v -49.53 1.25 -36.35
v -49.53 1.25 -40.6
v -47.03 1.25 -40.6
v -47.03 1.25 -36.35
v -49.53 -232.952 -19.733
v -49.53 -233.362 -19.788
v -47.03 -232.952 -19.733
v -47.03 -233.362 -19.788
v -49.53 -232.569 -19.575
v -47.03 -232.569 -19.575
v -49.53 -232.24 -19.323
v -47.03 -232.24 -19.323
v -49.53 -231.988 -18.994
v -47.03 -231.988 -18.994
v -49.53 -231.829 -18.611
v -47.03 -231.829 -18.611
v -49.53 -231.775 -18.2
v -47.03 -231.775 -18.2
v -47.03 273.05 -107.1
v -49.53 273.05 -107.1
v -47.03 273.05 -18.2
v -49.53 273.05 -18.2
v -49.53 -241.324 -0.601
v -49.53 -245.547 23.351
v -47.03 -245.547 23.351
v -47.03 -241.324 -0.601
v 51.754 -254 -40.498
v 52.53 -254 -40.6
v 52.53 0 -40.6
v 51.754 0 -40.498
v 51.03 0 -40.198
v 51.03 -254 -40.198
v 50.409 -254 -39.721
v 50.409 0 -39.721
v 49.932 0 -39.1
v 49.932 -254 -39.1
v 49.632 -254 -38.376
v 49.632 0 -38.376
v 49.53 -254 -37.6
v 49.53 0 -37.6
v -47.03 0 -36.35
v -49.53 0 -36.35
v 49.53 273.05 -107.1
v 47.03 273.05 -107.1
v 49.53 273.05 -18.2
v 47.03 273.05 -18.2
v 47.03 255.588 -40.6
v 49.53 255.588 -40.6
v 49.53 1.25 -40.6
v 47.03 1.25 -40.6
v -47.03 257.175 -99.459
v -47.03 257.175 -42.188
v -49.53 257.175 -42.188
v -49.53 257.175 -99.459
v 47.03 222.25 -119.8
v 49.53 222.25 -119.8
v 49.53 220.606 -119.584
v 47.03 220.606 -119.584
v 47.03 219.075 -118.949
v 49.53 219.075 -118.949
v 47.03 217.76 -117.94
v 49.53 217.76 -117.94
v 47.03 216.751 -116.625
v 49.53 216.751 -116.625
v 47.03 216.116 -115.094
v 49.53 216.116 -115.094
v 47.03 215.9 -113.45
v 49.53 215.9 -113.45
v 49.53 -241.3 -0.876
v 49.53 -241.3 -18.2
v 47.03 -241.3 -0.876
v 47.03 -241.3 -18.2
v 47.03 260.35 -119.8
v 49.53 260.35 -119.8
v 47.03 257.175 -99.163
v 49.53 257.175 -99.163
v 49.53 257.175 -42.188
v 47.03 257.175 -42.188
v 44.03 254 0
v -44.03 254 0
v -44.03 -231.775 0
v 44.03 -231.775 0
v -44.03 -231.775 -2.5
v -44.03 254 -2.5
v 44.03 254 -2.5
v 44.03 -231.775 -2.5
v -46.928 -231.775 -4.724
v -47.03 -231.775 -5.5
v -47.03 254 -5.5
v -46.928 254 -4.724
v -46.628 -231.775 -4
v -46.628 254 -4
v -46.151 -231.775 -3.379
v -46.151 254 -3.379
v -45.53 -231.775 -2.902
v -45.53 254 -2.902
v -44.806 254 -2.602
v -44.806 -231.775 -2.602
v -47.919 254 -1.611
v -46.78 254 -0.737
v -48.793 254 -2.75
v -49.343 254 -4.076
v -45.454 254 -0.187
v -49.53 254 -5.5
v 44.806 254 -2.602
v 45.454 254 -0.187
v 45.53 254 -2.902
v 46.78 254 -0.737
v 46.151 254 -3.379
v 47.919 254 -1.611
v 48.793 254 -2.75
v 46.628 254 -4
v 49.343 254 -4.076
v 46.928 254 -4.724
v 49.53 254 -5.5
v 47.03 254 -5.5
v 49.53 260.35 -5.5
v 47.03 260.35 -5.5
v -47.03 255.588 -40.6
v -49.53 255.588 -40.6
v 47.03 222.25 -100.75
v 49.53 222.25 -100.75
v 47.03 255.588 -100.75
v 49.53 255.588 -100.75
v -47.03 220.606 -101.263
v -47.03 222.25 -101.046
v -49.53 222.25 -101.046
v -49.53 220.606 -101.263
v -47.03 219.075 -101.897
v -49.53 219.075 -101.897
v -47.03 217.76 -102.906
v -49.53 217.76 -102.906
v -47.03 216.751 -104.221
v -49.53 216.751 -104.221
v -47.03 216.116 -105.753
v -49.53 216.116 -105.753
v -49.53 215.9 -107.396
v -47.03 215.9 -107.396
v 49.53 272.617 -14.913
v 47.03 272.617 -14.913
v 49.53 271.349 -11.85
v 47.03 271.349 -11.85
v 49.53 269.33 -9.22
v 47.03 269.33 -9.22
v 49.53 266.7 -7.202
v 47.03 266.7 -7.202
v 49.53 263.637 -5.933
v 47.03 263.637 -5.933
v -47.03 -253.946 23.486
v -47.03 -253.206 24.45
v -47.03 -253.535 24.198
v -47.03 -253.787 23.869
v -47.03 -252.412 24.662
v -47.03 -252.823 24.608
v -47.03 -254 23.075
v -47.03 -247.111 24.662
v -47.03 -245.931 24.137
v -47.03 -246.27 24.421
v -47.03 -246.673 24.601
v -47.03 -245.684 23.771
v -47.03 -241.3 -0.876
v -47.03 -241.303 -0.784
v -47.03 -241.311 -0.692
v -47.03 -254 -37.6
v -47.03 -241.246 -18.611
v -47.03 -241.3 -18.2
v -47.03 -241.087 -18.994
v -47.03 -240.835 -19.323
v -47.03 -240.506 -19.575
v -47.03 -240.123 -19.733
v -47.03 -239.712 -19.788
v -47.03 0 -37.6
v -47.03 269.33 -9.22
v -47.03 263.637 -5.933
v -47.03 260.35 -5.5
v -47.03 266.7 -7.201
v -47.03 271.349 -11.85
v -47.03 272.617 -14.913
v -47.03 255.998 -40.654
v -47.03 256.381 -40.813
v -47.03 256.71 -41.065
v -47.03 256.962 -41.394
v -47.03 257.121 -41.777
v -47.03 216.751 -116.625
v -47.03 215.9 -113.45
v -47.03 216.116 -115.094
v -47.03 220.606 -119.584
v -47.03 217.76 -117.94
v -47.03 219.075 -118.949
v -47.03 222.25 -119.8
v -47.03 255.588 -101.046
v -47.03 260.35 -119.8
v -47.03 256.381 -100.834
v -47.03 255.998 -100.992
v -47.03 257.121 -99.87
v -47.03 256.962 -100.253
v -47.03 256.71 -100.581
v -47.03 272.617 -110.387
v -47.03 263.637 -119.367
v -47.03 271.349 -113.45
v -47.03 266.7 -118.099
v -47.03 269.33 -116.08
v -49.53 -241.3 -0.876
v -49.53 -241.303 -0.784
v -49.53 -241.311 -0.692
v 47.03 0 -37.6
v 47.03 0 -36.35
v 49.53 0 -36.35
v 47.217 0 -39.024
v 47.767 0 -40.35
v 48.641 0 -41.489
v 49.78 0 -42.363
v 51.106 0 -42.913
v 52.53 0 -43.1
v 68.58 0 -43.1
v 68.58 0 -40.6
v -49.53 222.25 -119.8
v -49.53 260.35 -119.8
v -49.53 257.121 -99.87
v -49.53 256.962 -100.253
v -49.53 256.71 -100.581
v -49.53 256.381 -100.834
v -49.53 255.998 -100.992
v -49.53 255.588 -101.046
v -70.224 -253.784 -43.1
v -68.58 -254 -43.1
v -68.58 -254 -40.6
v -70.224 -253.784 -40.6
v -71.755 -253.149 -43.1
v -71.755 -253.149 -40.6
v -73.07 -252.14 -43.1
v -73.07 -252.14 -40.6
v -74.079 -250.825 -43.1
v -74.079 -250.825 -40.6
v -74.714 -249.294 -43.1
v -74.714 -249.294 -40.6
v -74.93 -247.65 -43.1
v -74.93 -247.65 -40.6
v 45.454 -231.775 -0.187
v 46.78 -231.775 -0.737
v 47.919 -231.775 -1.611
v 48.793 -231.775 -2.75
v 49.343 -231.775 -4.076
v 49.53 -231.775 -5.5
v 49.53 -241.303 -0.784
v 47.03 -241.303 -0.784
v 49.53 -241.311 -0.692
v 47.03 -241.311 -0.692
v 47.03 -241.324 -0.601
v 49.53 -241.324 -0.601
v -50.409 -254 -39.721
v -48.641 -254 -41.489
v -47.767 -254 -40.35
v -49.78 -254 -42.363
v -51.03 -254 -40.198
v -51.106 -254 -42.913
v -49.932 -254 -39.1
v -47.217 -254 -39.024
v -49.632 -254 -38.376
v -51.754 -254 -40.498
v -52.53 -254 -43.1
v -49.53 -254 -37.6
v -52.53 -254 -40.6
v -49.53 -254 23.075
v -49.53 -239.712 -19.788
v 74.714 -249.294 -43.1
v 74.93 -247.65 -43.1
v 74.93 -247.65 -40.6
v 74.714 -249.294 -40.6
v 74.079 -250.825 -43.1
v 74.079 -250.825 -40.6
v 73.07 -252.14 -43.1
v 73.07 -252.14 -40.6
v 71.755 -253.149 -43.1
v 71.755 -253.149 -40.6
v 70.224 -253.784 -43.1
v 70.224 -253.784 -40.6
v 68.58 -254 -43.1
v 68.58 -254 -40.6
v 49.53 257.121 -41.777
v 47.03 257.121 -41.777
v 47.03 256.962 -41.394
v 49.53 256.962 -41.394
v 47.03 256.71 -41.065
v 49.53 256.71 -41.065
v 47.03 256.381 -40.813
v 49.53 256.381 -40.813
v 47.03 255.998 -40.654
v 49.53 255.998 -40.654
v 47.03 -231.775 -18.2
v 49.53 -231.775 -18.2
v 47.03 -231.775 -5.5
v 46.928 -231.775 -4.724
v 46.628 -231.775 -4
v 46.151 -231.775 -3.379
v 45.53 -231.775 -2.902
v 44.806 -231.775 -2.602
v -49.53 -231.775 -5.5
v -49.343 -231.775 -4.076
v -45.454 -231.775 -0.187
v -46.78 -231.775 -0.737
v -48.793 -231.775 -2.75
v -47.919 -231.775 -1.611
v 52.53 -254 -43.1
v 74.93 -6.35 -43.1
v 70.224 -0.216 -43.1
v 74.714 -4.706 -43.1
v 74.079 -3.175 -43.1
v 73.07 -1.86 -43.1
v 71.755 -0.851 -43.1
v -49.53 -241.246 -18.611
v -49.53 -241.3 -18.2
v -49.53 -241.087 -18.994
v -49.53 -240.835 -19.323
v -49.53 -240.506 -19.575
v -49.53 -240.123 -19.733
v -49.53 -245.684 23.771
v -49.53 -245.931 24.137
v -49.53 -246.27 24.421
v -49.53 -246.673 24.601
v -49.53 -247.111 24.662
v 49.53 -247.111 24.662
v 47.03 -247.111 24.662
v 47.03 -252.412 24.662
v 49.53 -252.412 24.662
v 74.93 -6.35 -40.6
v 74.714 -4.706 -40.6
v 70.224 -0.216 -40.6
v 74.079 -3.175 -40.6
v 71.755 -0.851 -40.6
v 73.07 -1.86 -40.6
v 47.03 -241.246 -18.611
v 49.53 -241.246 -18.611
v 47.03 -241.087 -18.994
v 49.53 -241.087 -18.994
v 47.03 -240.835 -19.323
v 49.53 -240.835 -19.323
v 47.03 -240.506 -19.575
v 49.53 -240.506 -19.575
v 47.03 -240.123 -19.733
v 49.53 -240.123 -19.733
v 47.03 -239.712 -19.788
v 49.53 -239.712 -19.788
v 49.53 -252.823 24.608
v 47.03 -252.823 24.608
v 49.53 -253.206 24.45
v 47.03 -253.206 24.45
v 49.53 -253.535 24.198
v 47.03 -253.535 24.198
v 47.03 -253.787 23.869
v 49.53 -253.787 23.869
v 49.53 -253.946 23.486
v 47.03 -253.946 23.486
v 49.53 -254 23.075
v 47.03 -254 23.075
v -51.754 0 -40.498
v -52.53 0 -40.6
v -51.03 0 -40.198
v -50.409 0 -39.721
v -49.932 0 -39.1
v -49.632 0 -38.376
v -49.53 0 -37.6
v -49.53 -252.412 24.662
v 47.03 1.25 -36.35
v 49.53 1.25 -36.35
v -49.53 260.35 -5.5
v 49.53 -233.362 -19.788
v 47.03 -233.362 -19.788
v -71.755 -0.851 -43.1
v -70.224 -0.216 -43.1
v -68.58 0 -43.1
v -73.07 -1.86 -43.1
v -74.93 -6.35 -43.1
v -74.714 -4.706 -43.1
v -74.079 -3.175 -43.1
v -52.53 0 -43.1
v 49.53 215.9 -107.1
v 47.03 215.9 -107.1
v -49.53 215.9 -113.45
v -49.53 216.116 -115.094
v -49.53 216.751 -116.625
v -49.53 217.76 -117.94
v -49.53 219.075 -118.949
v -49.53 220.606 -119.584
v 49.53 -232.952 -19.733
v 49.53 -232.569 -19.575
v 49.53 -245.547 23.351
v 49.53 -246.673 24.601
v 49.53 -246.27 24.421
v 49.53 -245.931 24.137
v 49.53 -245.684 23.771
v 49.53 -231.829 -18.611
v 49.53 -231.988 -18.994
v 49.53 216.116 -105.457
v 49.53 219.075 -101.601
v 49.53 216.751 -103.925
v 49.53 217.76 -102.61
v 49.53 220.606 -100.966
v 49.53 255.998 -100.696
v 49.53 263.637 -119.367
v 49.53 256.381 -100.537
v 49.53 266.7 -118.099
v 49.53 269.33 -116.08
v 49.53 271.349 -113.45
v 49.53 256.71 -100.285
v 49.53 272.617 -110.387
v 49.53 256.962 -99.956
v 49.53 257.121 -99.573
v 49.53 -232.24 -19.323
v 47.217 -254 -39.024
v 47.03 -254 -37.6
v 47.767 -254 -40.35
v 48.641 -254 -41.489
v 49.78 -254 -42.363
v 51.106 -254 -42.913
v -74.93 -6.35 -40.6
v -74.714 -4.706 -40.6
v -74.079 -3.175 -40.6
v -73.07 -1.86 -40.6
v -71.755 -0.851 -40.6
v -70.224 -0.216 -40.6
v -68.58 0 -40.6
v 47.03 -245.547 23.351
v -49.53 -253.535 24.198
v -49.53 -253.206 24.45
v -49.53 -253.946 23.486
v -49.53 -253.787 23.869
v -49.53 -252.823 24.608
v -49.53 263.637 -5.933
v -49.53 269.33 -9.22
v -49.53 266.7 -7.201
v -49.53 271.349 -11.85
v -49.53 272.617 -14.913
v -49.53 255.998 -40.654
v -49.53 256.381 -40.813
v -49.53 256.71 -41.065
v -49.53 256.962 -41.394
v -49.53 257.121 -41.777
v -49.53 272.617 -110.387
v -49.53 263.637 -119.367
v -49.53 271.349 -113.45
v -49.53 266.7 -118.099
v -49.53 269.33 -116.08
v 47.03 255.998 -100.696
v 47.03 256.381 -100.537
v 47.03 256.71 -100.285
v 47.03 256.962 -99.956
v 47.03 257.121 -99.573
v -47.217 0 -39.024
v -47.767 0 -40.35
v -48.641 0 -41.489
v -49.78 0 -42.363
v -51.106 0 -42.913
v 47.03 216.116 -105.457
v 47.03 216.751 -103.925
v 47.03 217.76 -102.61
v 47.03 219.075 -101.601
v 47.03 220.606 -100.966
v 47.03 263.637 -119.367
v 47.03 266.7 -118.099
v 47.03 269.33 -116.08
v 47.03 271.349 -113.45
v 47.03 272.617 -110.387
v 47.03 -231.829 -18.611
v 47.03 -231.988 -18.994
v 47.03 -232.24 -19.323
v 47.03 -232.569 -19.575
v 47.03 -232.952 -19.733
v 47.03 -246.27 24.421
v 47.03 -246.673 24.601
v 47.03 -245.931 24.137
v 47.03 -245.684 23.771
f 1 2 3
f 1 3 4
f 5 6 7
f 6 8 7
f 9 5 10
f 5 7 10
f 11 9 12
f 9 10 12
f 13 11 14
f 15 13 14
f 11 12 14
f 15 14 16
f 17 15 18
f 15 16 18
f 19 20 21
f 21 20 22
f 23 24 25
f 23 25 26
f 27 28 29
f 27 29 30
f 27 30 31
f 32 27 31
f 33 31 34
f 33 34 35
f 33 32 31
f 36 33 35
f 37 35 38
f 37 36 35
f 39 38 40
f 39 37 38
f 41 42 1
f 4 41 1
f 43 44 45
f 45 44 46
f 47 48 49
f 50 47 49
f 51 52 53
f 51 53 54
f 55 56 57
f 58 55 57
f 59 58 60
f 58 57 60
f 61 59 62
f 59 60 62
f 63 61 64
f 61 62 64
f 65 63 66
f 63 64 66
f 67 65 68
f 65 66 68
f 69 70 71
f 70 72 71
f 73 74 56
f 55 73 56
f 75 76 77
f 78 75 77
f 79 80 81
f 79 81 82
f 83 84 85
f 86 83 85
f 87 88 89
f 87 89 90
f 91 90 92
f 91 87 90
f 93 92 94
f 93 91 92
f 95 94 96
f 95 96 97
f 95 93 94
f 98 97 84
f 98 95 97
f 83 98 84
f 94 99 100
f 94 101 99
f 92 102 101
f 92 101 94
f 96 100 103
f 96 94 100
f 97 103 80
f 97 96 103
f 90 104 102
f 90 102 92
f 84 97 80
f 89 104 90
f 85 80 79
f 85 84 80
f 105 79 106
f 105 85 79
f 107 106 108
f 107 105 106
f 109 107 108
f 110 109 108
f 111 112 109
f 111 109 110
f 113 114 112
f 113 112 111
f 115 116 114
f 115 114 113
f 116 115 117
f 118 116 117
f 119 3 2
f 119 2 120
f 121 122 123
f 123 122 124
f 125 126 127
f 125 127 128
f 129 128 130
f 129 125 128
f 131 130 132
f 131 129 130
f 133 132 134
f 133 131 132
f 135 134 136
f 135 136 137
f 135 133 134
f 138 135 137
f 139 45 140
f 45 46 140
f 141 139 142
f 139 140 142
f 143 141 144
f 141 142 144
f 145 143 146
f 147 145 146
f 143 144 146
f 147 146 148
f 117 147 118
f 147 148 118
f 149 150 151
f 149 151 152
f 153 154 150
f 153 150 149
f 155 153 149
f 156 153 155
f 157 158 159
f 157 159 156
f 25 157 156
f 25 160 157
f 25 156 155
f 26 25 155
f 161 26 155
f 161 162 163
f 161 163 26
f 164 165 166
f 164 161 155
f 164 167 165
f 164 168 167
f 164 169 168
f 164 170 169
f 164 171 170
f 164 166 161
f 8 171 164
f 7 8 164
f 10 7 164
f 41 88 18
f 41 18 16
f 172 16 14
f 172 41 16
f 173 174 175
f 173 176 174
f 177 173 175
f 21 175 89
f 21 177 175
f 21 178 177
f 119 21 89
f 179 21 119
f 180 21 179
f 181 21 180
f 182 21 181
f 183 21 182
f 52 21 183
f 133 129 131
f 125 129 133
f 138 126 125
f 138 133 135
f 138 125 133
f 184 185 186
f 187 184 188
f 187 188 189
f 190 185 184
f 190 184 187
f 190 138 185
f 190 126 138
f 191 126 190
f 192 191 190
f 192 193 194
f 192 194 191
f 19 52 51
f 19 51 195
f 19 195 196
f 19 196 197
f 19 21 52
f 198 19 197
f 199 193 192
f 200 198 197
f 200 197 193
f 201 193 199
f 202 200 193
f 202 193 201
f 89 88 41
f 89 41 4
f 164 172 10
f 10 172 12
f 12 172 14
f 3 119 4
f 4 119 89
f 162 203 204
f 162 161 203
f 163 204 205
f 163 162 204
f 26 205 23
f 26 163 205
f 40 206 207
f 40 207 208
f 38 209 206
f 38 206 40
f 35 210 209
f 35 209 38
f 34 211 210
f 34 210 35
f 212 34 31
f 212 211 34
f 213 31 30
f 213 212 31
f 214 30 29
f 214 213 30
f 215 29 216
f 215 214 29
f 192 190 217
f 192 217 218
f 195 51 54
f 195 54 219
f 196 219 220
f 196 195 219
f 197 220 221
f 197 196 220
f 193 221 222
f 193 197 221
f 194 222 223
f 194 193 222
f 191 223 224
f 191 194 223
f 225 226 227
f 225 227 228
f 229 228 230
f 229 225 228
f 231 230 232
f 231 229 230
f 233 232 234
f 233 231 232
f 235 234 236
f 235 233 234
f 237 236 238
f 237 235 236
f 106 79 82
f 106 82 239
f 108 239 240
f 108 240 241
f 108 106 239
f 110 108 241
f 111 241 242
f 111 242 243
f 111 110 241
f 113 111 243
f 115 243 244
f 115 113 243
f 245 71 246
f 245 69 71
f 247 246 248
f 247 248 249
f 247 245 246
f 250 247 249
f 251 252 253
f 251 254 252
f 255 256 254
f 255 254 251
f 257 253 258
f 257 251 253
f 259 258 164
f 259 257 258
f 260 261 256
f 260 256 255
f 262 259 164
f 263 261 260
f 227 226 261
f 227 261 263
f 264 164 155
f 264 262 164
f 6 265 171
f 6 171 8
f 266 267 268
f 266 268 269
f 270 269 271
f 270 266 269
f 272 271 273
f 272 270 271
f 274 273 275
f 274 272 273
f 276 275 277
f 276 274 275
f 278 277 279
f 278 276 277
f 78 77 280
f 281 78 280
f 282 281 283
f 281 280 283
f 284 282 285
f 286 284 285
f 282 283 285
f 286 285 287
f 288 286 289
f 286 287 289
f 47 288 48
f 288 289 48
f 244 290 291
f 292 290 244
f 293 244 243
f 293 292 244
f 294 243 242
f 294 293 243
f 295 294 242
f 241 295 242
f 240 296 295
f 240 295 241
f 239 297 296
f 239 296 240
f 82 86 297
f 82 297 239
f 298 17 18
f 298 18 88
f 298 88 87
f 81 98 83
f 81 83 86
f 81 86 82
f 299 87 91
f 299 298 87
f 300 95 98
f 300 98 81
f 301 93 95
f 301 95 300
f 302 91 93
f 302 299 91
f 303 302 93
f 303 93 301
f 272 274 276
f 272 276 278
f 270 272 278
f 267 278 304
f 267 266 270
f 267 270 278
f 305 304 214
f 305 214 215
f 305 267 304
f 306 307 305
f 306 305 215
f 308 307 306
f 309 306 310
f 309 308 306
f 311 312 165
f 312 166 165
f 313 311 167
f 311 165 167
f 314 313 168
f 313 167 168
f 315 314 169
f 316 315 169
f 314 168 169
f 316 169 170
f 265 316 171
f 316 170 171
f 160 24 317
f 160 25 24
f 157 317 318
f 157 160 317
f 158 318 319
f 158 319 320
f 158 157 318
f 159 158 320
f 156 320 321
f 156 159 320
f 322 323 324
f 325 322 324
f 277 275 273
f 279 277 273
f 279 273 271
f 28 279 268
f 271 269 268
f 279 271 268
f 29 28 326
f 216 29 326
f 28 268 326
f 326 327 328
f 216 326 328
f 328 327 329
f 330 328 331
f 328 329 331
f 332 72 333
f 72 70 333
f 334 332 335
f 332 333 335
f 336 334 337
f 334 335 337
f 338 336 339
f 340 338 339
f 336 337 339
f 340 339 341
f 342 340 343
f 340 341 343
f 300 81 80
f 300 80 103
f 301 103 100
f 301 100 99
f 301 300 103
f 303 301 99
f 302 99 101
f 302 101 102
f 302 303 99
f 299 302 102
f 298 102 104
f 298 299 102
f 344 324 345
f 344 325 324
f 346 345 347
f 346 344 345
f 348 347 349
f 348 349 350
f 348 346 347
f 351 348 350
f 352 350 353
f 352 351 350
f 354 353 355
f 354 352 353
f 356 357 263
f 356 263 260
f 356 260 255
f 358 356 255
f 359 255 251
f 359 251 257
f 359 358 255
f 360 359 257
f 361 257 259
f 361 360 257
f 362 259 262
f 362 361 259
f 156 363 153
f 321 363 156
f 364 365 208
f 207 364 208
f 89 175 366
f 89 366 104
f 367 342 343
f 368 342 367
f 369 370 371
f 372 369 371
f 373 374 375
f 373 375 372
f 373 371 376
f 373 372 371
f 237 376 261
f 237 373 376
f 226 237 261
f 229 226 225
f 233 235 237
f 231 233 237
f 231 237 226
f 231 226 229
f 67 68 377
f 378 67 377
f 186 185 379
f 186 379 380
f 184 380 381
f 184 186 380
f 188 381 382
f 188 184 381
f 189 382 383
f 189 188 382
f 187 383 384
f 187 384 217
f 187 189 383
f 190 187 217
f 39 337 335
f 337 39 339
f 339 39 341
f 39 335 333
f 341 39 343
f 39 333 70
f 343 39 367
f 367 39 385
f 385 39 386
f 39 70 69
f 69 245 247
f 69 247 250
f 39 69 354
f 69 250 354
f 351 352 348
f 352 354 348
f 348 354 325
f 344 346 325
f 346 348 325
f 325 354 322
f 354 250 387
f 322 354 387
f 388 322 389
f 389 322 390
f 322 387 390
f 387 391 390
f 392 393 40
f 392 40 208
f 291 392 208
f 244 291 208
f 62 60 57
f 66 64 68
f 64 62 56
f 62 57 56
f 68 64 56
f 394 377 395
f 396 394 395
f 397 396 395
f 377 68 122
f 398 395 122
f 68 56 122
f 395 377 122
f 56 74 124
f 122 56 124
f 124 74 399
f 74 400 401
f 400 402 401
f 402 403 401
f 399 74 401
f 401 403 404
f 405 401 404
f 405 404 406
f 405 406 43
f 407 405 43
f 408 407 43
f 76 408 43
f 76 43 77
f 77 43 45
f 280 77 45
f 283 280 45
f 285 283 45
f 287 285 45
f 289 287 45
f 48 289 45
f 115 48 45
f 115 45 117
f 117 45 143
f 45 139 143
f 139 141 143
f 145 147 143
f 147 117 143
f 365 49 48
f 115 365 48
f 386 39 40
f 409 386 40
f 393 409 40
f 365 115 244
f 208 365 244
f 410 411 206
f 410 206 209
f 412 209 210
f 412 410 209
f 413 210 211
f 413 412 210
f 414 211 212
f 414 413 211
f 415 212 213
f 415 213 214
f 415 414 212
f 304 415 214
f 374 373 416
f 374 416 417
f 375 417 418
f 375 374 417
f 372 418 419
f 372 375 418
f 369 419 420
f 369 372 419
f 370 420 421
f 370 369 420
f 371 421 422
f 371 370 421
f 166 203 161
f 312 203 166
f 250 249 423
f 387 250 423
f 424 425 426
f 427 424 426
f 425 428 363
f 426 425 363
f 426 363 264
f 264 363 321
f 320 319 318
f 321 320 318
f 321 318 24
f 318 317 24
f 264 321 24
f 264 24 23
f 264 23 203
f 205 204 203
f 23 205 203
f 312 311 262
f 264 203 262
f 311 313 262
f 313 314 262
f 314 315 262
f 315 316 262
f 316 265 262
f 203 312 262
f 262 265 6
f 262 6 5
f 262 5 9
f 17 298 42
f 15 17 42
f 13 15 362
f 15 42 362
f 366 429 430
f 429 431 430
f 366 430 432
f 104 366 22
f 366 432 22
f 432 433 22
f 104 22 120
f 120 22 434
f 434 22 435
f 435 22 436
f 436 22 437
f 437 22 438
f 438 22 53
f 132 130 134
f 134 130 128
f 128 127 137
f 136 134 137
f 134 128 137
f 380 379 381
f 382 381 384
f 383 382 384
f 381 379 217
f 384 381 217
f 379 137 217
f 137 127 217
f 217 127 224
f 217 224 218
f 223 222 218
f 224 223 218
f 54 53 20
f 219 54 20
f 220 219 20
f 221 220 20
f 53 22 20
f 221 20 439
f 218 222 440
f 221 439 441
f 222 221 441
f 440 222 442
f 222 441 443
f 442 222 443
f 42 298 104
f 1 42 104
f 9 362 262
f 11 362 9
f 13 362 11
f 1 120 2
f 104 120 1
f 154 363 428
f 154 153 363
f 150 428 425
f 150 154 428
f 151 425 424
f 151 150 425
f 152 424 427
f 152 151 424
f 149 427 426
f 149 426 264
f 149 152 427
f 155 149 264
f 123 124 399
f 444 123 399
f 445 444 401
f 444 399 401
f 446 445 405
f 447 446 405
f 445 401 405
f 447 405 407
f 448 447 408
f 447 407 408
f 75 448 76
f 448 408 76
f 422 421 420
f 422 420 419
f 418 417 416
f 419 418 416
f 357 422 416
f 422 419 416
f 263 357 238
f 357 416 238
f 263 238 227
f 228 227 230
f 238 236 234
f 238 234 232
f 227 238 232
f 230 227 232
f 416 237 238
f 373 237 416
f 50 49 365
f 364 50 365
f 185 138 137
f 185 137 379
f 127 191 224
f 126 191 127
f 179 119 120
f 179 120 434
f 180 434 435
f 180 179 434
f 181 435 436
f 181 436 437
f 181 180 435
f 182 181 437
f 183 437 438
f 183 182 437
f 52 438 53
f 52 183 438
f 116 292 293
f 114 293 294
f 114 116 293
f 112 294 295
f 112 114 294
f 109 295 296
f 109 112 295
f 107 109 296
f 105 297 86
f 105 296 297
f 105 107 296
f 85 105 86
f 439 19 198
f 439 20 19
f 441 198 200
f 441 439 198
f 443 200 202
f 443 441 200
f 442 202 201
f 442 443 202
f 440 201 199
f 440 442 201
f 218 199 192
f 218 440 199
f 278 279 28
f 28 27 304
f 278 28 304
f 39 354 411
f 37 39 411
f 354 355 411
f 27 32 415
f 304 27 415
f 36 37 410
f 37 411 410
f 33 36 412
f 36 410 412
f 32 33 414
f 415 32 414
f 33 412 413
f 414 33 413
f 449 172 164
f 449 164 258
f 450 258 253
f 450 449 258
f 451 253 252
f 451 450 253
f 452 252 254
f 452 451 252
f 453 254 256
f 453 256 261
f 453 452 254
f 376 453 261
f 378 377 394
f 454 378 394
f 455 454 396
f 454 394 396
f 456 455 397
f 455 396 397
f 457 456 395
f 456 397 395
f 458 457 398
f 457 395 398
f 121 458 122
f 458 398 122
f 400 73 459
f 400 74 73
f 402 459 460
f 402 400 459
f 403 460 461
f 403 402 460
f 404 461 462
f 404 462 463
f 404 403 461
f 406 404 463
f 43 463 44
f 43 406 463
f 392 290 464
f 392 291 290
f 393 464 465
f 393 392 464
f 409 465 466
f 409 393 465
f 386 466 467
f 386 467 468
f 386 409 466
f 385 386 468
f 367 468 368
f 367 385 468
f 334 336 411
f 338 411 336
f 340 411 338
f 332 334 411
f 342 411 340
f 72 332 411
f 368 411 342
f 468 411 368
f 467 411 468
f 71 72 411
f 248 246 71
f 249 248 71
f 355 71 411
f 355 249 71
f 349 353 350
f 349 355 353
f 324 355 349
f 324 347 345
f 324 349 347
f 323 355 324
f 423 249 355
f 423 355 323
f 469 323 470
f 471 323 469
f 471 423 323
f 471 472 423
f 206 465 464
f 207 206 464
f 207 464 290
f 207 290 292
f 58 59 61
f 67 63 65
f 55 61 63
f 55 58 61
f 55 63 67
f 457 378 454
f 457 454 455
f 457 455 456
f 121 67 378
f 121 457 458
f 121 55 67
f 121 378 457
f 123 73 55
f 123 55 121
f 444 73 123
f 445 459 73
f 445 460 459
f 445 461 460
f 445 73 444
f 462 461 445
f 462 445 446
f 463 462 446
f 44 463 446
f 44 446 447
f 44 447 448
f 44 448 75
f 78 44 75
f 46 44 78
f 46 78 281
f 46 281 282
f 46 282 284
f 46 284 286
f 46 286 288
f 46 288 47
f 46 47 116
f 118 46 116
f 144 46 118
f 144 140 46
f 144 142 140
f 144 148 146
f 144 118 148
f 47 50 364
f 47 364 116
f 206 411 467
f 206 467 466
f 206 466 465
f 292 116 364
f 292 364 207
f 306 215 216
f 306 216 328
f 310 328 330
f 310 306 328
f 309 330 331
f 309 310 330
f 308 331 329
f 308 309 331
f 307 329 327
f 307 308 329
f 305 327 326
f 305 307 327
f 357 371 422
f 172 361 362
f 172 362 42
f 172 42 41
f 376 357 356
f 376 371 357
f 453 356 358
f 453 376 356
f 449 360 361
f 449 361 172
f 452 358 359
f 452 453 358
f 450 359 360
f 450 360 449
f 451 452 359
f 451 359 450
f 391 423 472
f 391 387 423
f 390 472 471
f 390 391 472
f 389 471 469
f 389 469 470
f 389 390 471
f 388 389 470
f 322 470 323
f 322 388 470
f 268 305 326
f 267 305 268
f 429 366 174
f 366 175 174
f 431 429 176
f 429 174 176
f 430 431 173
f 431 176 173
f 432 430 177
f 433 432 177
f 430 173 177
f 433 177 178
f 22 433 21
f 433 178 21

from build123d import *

# Parameters (mm, degrees)
SKETCH1_W                     = 99.06
SKETCH1_H                     = 508
BASE_FLANGE1_DEPTH            = 2.5
EDGE_FLANGE1_STRIP_W          = 16
EDGE_FLANGE1_STRIP_H          = 2.5
EDGE_FLANGE1_STRIP_CUT_DEPTH  = 508
EDGE_FLANGE1_DEPTH            = 508
EDGE_FLANGE2_STRIP_W          = 16
EDGE_FLANGE2_STRIP_H          = 2.5
EDGE_FLANGE2_STRIP_CUT_DEPTH  = 254
EDGE_FLANGE2_RELIEF_W         = 17.25
EDGE_FLANGE2_RELIEF_H         = 1.25
EDGE_FLANGE2_RELIEF_CUT_DEPTH = 2.5
EDGE_FLANGE2_DEPTH            = 254
EDGE_FLANGE2_START            = 2.5
EDGE_FLANGE2_FLAT_DEPTH       = 2.5
EDGE_FLANGE3_STRIP_W          = 16
EDGE_FLANGE3_STRIP_H          = 2.5
EDGE_FLANGE3_STRIP_CUT_DEPTH  = 508
EDGE_FLANGE3_DEPTH            = 508
EDGE_FLANGE4_STRIP_W          = 16
EDGE_FLANGE4_STRIP_H          = 2.5
EDGE_FLANGE4_STRIP_CUT_DEPTH  = 254
EDGE_FLANGE4_RELIEF_W         = 17.25
EDGE_FLANGE4_RELIEF_H         = 1.25
EDGE_FLANGE4_RELIEF_CUT_DEPTH = 2.5
EDGE_FLANGE4_DEPTH            = 254
EDGE_FLANGE4_START            = 2.5
EDGE_FLANGE4_FLAT_DEPTH       = 2.5
SKETCH22_W                    = 5.5
SKETCH22_H                    = 22.225
CUT_EXTRUDE5_DEPTH            = 287.118684465
TAB1_DEPTH                    = 2.5
TAB2_START                    = -2.5
TAB2_DEPTH                    = 2.5
TAB3_DEPTH                    = 2.5
TAB4_START                    = -2.5
TAB4_DEPTH                    = 2.5
SKETCH47_W                    = 14.2875
SKETCH47_H                    = 9.525
CUT_EXTRUDE6_DEPTH            = 337.63035334
FILLET2_R                     = 1.5875
FILLET3_R                     = 1.5875
SKETCH48_W                    = 2.54
SKETCH48_H                    = 15.875
CUT_EXTRUDE9_DEPTH            = 337.63035334
FILLET4_R                     = 12.7


# Read off the part's stored shape, not the designer's step: Tab2
# Sheet-metal steps are written as plain solids
with BuildPart() as part:
    # Sketch1 → Base-Flange1 (new body)
    with BuildSketch(Plane.XY):
        Rectangle(SKETCH1_W, SKETCH1_H)
    extrude(amount=-BASE_FLANGE1_DEPTH)

    # Edge-Flange1 strip (across the edge) → Edge-Flange1 strip cut (cut)
    with BuildSketch(Plane(origin=(-49.53, -254, -2.5), x_dir=(1, 0, 0), z_dir=(0, 1, 0))):
        with Locations((-2.5, -1.25)):
            Rectangle(EDGE_FLANGE1_STRIP_W, EDGE_FLANGE1_STRIP_H)
    extrude(amount=EDGE_FLANGE1_STRIP_CUT_DEPTH, mode=Mode.SUBTRACT)

    # Edge-Flange1 section (across the edge) → Edge-Flange1 (add)
    with BuildSketch(Plane(origin=(-49.53, -254, -2.5), x_dir=(1, 0, 0), z_dir=(0, 1, 0))):
        with BuildLine():
            Line((0, 3), (0, 38.1))
            Line((0, 38.1), (2.5, 38.1))
            Line((2.5, 38.1), (2.5, 3))
            ThreePointArc((2.5, 3), (3.378679656, 0.878679656), (5.5, 0))
            Line((5.5, 0), (5.5, -2.5))
            ThreePointArc((5.5, -2.5), (1.610912703, -0.889087297), (0, 3))
        make_face()
    extrude(amount=EDGE_FLANGE1_DEPTH)

    # Edge-Flange2 strip (across the edge) → Edge-Flange2 strip cut (cut)
    with BuildSketch(Plane(origin=(-49.53, 0, -40.6), x_dir=(0, 0, 1), z_dir=(0, -1, 0))):
        with Locations((-5, -1.25)):
            Rectangle(EDGE_FLANGE2_STRIP_W, EDGE_FLANGE2_STRIP_H)
    extrude(amount=EDGE_FLANGE2_STRIP_CUT_DEPTH, mode=Mode.SUBTRACT)

    # Edge-Flange2 relief (on the sheet) → Edge-Flange2 relief cut (cut)
    with BuildSketch(Plane(origin=(-49.53, 0, -37.6), x_dir=(0, 0, 1), z_dir=(-1, 0, 0))):
        with Locations((-7.375, 0.625)):
            Rectangle(EDGE_FLANGE2_RELIEF_W, EDGE_FLANGE2_RELIEF_H)
    extrude(amount=-EDGE_FLANGE2_RELIEF_CUT_DEPTH, mode=Mode.SUBTRACT)

    # Edge-Flange2 bend section (across the edge) → Edge-Flange2 (add)
    with BuildSketch(Plane(origin=(-49.53, 0, -40.6), x_dir=(0, 0, 1), z_dir=(0, -1, 0))):
        with BuildLine():
            Line((-2.5, 3), (0, 3))
            ThreePointArc((0, 3), (0.878679656, 0.878679656), (3, 0))
            Line((3, 0), (3, -2.5))
            ThreePointArc((3, -2.5), (-0.889087297, -0.889087297), (-2.5, 3))
        make_face()
    extrude(amount=EDGE_FLANGE2_DEPTH)

    # Edge-Flange2 profile (on flange) → Edge-Flange2 flat (add)
    with BuildSketch(Plane(origin=(-49.53, 0, -40.6), x_dir=(0, -1, 0), z_dir=(0, 0, -1)).offset(EDGE_FLANGE2_START)):
        with BuildLine():
            Line((254, 3), (254, 19.05))
            ThreePointArc((254, 19.05), (252.140128061, 23.540128061), (247.65, 25.4))
            Line((247.65, 25.4), (6.35, 25.4))
            ThreePointArc((6.35, 25.4), (1.859871939, 23.540128061), (0, 19.05))
            Line((0, 19.05), (0, 3))
            Line((0, 3), (254, 3))
        make_face()
    extrude(amount=-EDGE_FLANGE2_FLAT_DEPTH)

    # Edge-Flange3 strip (across the edge) → Edge-Flange3 strip cut (cut)
    with BuildSketch(Plane(origin=(49.53, 254, -2.5), x_dir=(-1, 0, 0), z_dir=(0, -1, 0))):
        with Locations((-2.5, -1.25)):
            Rectangle(EDGE_FLANGE3_STRIP_W, EDGE_FLANGE3_STRIP_H)
    extrude(amount=EDGE_FLANGE3_STRIP_CUT_DEPTH, mode=Mode.SUBTRACT)

    # Edge-Flange3 section (across the edge) → Edge-Flange3 (add)
    with BuildSketch(Plane(origin=(49.53, 254, -2.5), x_dir=(-1, 0, 0), z_dir=(0, -1, 0))):
        with BuildLine():
            Line((0, 3), (0, 38.1))
            Line((0, 38.1), (2.5, 38.1))
            Line((2.5, 38.1), (2.5, 3))
            ThreePointArc((2.5, 3), (3.378679656, 0.878679656), (5.5, 0))
            Line((5.5, 0), (5.5, -2.5))
            ThreePointArc((5.5, -2.5), (1.610912703, -0.889087297), (0, 3))
        make_face()
    extrude(amount=EDGE_FLANGE3_DEPTH)

    # Edge-Flange4 strip (across the edge) → Edge-Flange4 strip cut (cut)
    with BuildSketch(Plane(origin=(49.53, -254, -40.6), x_dir=(0, 0, 1), z_dir=(0, 1, 0))):
        with Locations((-5, -1.25)):
            Rectangle(EDGE_FLANGE4_STRIP_W, EDGE_FLANGE4_STRIP_H)
    extrude(amount=EDGE_FLANGE4_STRIP_CUT_DEPTH, mode=Mode.SUBTRACT)

    # Edge-Flange4 relief (on the sheet) → Edge-Flange4 relief cut (cut)
    with BuildSketch(Plane(origin=(49.53, -254, -37.6), x_dir=(0, 0, 1), z_dir=(1, 0, 0))):
        with Locations((-7.375, -254.625)):
            Rectangle(EDGE_FLANGE4_RELIEF_W, EDGE_FLANGE4_RELIEF_H)
    extrude(amount=-EDGE_FLANGE4_RELIEF_CUT_DEPTH, mode=Mode.SUBTRACT)

    # Edge-Flange4 bend section (across the edge) → Edge-Flange4 (add)
    with BuildSketch(Plane(origin=(49.53, -254, -40.6), x_dir=(0, 0, 1), z_dir=(0, 1, 0))):
        with BuildLine():
            Line((-2.5, 3), (0, 3))
            ThreePointArc((0, 3), (0.878679656, 0.878679656), (3, 0))
            Line((3, 0), (3, -2.5))
            ThreePointArc((3, -2.5), (-0.889087297, -0.889087297), (-2.5, 3))
        make_face()
    extrude(amount=EDGE_FLANGE4_DEPTH)

    # Edge-Flange4 profile (on flange) → Edge-Flange4 flat (add)
    with BuildSketch(Plane(origin=(49.53, 0, -40.6), x_dir=(0, 1, 0), z_dir=(0, 0, -1)).offset(EDGE_FLANGE4_START)):
        with BuildLine():
            Line((-254, 19.05), (-254, 3))
            Line((-254, 3), (0, 3))
            Line((0, 3), (0, 19.05))
            ThreePointArc((0, 19.05), (-1.859871939, 23.540128061), (-6.35, 25.4))
            Line((-6.35, 25.4), (-247.65, 25.4))
            ThreePointArc((-247.65, 25.4), (-252.140128061, 23.540128061), (-254, 19.05))
        make_face()
    extrude(amount=-EDGE_FLANGE4_FLAT_DEPTH)

    # Sketch22 → Cut-Extrude5 (cut, through all)
    with BuildSketch(Plane.ZY.offset(49.53)):
        with Locations((-2.75, -242.8875)):
            Rectangle(SKETCH22_W, SKETCH22_H)
    extrude(amount=-CUT_EXTRUDE5_DEPTH, mode=Mode.SUBTRACT)

    # Sketch30 → Tab1 (add)
    with BuildSketch(Plane.ZY.offset(49.53)):
        Polygon((-5.5, -254), (24.6625, -254), (24.6625, -245.77870531), (-0.7375, -241.3), (-5.5, -241.3), align=None)
    extrude(amount=-TAB1_DEPTH)

    # Tab2 outline → Tab2 (add)
    with BuildSketch(Plane(origin=(49.53, 0, 0), x_dir=(0, 0, -1), z_dir=(1, 0, 0)).offset(TAB2_START)):
        Polygon((-24.6625, -254), (5.5, -254), (5.5, -241.3), (0.7375, -241.3), (-24.6625, -245.77870531), align=None)
    extrude(amount=TAB2_DEPTH)

    # Sketch43 → Tab3 (add)
    with BuildSketch(Plane(origin=(49.53, 0, 0), x_dir=(0, 0, -1), z_dir=(1, 0, 0))):
        with BuildLine():
            Line((8.675031572, 288.925), (116.625031572, 288.925))
            ThreePointArc((116.625031572, 288.925), (118.870095602, 287.99506403), (119.800031572, 285.75))
            Line((119.800031572, 285.75), (119.800031572, 254))
            Line((119.800031572, 254), (119.800031572, 222.25))
            ThreePointArc((119.800031572, 222.25), (117.940159632, 217.759871939), (113.450031572, 215.9))
            Line((113.450031572, 215.9), (107.100031572, 215.9))
            ThreePointArc((107.100031572, 215.9), (102.609903511, 217.759871939), (100.750031572, 222.25))
            Line((100.750031572, 222.25), (100.750031572, 250.825))
            Line((100.750031572, 250.825), (100.750031572, 254))
            Line((100.750031572, 254), (100.750031572, 255.5875))
            ThreePointArc((100.750031572, 255.5875), (100.285063587, 256.710032015), (99.162531572, 257.175))
            Line((99.162531572, 257.175), (42.1875, 257.175))
            ThreePointArc((42.1875, 257.175), (41.064967985, 256.710032015), (40.6, 255.5875))
            Line((40.6, 255.5875), (40.6, 254))
            Line((40.6, 254), (5.500031572, 254))
            Line((5.500031572, 254), (5.500031572, 285.75))
            ThreePointArc((5.500031572, 285.75), (6.429967542, 287.99506403), (8.675031572, 288.925))
        make_face()
    extrude(amount=-TAB3_DEPTH)

    # Sketch46 → Tab4 (add)
    with BuildSketch(Plane.ZY.offset(49.53).offset(TAB4_START)):
        with BuildLine():
            Line((-116.625, 288.925), (-8.675, 288.925))
            ThreePointArc((-8.675, 288.925), (-6.42993597, 287.99506403), (-5.5, 285.75))
            Line((-5.5, 285.75), (-5.5, 254))
            Line((-5.5, 254), (-40.6, 254))
            Line((-40.6, 254), (-40.6, 255.5875))
            ThreePointArc((-40.6, 255.5875), (-41.064967985, 256.710032015), (-42.1875, 257.175))
            Line((-42.1875, 257.175), (-99.458781194, 257.175))
            ThreePointArc((-99.458781194, 257.175), (-100.581313209, 256.710032015), (-101.046281194, 255.5875))
            Line((-101.046281194, 255.5875), (-101.046281194, 254))
            Line((-101.046281194, 254), (-101.046281194, 222.25))
            ThreePointArc((-101.046281194, 222.25), (-102.906153133, 217.759871939), (-107.396281194, 215.9))
            Line((-107.396281194, 215.9), (-113.45, 215.9))
            ThreePointArc((-113.45, 215.9), (-117.940128061, 217.759871939), (-119.8, 222.25))
            Line((-119.8, 222.25), (-119.8, 254))
            Line((-119.8, 254), (-119.8, 285.75))
            ThreePointArc((-119.8, 285.75), (-118.87006403, 287.99506403), (-116.625, 288.925))
        make_face()
    extrude(amount=TAB4_DEPTH)

    # Sketch47 → Cut-Extrude6 (cut, through all)
    with BuildSketch(Plane.ZY.offset(49.53)):
        with Locations((-12.64375, -236.5375)):
            Rectangle(SKETCH47_W, SKETCH47_H)
    extrude(amount=-CUT_EXTRUDE6_DEPTH, mode=Mode.SUBTRACT)

    # Fillet2
    fillet2_edges = [part.edges().sort_by_distance(p)[0] for p in [
        (48.28, -231.775, -19.7875),
        (48.28, -241.3, -19.7875),
        (-48.28, -231.775, -19.7875),
        (-48.28, -241.3, -19.7875),
    ]]
    fillet(fillet2_edges, radius=FILLET2_R)

    # Fillet3
    fillet3_edges = [part.edges().sort_by_distance(p)[0] for p in [
        (-48.28, -241.3, -0.7375),
        (-48.28, -245.77870531, 24.6625),
        (-48.28, -254, 24.6625),
        (48.28, -254, 24.6625),
        (48.28, -245.77870531, 24.6625),
        (48.28, -241.3, -0.7375),
    ]]
    fillet(fillet3_edges, radius=FILLET3_R)

    # Sketch48 → Cut-Extrude9 (cut, through all)
    with BuildSketch(Plane.ZY.offset(49.53)):
        with BuildLine():
            Line((-8.675, 288.925), (-116.625, 288.925))
            ThreePointArc((-116.625, 288.925), (-118.87006403, 287.99506403), (-119.8, 285.75))
            Line((-119.8, 285.75), (-119.8, 273.05))
            Line((-119.8, 273.05), (-5.5, 273.05))
            Line((-5.5, 273.05), (-5.5, 285.75))
            ThreePointArc((-5.5, 285.75), (-6.42993597, 287.99506403), (-8.675, 288.925))
        make_face()
        with Locations((-121.07, 280.9875)):
            Rectangle(SKETCH48_W, SKETCH48_H)
    extrude(amount=-CUT_EXTRUDE9_DEPTH, mode=Mode.SUBTRACT)


with BuildPart() as cut_extrude9_kept_piece:
    # of the separate pieces the step leaves, the one the design keeps (cut_extrude9_pieces_kept)
    add(part.part.solids().sort_by_distance((47.03, -241.3, -0.876388253))[0])

    # Fillet4
    fillet4_edges = [cut_extrude9_kept_piece.edges().sort_by_distance(p)[0] for p in [
        (-48.28, 273.05, -119.8),
        (48.28, 273.05, -5.500031572),
        (48.28, 273.05, -119.800031572),
        (-48.28, 273.05, -5.5),
    ]]
    fillet(fillet4_edges, radius=FILLET4_R)


solid = cut_extrude9_kept_piece.part
